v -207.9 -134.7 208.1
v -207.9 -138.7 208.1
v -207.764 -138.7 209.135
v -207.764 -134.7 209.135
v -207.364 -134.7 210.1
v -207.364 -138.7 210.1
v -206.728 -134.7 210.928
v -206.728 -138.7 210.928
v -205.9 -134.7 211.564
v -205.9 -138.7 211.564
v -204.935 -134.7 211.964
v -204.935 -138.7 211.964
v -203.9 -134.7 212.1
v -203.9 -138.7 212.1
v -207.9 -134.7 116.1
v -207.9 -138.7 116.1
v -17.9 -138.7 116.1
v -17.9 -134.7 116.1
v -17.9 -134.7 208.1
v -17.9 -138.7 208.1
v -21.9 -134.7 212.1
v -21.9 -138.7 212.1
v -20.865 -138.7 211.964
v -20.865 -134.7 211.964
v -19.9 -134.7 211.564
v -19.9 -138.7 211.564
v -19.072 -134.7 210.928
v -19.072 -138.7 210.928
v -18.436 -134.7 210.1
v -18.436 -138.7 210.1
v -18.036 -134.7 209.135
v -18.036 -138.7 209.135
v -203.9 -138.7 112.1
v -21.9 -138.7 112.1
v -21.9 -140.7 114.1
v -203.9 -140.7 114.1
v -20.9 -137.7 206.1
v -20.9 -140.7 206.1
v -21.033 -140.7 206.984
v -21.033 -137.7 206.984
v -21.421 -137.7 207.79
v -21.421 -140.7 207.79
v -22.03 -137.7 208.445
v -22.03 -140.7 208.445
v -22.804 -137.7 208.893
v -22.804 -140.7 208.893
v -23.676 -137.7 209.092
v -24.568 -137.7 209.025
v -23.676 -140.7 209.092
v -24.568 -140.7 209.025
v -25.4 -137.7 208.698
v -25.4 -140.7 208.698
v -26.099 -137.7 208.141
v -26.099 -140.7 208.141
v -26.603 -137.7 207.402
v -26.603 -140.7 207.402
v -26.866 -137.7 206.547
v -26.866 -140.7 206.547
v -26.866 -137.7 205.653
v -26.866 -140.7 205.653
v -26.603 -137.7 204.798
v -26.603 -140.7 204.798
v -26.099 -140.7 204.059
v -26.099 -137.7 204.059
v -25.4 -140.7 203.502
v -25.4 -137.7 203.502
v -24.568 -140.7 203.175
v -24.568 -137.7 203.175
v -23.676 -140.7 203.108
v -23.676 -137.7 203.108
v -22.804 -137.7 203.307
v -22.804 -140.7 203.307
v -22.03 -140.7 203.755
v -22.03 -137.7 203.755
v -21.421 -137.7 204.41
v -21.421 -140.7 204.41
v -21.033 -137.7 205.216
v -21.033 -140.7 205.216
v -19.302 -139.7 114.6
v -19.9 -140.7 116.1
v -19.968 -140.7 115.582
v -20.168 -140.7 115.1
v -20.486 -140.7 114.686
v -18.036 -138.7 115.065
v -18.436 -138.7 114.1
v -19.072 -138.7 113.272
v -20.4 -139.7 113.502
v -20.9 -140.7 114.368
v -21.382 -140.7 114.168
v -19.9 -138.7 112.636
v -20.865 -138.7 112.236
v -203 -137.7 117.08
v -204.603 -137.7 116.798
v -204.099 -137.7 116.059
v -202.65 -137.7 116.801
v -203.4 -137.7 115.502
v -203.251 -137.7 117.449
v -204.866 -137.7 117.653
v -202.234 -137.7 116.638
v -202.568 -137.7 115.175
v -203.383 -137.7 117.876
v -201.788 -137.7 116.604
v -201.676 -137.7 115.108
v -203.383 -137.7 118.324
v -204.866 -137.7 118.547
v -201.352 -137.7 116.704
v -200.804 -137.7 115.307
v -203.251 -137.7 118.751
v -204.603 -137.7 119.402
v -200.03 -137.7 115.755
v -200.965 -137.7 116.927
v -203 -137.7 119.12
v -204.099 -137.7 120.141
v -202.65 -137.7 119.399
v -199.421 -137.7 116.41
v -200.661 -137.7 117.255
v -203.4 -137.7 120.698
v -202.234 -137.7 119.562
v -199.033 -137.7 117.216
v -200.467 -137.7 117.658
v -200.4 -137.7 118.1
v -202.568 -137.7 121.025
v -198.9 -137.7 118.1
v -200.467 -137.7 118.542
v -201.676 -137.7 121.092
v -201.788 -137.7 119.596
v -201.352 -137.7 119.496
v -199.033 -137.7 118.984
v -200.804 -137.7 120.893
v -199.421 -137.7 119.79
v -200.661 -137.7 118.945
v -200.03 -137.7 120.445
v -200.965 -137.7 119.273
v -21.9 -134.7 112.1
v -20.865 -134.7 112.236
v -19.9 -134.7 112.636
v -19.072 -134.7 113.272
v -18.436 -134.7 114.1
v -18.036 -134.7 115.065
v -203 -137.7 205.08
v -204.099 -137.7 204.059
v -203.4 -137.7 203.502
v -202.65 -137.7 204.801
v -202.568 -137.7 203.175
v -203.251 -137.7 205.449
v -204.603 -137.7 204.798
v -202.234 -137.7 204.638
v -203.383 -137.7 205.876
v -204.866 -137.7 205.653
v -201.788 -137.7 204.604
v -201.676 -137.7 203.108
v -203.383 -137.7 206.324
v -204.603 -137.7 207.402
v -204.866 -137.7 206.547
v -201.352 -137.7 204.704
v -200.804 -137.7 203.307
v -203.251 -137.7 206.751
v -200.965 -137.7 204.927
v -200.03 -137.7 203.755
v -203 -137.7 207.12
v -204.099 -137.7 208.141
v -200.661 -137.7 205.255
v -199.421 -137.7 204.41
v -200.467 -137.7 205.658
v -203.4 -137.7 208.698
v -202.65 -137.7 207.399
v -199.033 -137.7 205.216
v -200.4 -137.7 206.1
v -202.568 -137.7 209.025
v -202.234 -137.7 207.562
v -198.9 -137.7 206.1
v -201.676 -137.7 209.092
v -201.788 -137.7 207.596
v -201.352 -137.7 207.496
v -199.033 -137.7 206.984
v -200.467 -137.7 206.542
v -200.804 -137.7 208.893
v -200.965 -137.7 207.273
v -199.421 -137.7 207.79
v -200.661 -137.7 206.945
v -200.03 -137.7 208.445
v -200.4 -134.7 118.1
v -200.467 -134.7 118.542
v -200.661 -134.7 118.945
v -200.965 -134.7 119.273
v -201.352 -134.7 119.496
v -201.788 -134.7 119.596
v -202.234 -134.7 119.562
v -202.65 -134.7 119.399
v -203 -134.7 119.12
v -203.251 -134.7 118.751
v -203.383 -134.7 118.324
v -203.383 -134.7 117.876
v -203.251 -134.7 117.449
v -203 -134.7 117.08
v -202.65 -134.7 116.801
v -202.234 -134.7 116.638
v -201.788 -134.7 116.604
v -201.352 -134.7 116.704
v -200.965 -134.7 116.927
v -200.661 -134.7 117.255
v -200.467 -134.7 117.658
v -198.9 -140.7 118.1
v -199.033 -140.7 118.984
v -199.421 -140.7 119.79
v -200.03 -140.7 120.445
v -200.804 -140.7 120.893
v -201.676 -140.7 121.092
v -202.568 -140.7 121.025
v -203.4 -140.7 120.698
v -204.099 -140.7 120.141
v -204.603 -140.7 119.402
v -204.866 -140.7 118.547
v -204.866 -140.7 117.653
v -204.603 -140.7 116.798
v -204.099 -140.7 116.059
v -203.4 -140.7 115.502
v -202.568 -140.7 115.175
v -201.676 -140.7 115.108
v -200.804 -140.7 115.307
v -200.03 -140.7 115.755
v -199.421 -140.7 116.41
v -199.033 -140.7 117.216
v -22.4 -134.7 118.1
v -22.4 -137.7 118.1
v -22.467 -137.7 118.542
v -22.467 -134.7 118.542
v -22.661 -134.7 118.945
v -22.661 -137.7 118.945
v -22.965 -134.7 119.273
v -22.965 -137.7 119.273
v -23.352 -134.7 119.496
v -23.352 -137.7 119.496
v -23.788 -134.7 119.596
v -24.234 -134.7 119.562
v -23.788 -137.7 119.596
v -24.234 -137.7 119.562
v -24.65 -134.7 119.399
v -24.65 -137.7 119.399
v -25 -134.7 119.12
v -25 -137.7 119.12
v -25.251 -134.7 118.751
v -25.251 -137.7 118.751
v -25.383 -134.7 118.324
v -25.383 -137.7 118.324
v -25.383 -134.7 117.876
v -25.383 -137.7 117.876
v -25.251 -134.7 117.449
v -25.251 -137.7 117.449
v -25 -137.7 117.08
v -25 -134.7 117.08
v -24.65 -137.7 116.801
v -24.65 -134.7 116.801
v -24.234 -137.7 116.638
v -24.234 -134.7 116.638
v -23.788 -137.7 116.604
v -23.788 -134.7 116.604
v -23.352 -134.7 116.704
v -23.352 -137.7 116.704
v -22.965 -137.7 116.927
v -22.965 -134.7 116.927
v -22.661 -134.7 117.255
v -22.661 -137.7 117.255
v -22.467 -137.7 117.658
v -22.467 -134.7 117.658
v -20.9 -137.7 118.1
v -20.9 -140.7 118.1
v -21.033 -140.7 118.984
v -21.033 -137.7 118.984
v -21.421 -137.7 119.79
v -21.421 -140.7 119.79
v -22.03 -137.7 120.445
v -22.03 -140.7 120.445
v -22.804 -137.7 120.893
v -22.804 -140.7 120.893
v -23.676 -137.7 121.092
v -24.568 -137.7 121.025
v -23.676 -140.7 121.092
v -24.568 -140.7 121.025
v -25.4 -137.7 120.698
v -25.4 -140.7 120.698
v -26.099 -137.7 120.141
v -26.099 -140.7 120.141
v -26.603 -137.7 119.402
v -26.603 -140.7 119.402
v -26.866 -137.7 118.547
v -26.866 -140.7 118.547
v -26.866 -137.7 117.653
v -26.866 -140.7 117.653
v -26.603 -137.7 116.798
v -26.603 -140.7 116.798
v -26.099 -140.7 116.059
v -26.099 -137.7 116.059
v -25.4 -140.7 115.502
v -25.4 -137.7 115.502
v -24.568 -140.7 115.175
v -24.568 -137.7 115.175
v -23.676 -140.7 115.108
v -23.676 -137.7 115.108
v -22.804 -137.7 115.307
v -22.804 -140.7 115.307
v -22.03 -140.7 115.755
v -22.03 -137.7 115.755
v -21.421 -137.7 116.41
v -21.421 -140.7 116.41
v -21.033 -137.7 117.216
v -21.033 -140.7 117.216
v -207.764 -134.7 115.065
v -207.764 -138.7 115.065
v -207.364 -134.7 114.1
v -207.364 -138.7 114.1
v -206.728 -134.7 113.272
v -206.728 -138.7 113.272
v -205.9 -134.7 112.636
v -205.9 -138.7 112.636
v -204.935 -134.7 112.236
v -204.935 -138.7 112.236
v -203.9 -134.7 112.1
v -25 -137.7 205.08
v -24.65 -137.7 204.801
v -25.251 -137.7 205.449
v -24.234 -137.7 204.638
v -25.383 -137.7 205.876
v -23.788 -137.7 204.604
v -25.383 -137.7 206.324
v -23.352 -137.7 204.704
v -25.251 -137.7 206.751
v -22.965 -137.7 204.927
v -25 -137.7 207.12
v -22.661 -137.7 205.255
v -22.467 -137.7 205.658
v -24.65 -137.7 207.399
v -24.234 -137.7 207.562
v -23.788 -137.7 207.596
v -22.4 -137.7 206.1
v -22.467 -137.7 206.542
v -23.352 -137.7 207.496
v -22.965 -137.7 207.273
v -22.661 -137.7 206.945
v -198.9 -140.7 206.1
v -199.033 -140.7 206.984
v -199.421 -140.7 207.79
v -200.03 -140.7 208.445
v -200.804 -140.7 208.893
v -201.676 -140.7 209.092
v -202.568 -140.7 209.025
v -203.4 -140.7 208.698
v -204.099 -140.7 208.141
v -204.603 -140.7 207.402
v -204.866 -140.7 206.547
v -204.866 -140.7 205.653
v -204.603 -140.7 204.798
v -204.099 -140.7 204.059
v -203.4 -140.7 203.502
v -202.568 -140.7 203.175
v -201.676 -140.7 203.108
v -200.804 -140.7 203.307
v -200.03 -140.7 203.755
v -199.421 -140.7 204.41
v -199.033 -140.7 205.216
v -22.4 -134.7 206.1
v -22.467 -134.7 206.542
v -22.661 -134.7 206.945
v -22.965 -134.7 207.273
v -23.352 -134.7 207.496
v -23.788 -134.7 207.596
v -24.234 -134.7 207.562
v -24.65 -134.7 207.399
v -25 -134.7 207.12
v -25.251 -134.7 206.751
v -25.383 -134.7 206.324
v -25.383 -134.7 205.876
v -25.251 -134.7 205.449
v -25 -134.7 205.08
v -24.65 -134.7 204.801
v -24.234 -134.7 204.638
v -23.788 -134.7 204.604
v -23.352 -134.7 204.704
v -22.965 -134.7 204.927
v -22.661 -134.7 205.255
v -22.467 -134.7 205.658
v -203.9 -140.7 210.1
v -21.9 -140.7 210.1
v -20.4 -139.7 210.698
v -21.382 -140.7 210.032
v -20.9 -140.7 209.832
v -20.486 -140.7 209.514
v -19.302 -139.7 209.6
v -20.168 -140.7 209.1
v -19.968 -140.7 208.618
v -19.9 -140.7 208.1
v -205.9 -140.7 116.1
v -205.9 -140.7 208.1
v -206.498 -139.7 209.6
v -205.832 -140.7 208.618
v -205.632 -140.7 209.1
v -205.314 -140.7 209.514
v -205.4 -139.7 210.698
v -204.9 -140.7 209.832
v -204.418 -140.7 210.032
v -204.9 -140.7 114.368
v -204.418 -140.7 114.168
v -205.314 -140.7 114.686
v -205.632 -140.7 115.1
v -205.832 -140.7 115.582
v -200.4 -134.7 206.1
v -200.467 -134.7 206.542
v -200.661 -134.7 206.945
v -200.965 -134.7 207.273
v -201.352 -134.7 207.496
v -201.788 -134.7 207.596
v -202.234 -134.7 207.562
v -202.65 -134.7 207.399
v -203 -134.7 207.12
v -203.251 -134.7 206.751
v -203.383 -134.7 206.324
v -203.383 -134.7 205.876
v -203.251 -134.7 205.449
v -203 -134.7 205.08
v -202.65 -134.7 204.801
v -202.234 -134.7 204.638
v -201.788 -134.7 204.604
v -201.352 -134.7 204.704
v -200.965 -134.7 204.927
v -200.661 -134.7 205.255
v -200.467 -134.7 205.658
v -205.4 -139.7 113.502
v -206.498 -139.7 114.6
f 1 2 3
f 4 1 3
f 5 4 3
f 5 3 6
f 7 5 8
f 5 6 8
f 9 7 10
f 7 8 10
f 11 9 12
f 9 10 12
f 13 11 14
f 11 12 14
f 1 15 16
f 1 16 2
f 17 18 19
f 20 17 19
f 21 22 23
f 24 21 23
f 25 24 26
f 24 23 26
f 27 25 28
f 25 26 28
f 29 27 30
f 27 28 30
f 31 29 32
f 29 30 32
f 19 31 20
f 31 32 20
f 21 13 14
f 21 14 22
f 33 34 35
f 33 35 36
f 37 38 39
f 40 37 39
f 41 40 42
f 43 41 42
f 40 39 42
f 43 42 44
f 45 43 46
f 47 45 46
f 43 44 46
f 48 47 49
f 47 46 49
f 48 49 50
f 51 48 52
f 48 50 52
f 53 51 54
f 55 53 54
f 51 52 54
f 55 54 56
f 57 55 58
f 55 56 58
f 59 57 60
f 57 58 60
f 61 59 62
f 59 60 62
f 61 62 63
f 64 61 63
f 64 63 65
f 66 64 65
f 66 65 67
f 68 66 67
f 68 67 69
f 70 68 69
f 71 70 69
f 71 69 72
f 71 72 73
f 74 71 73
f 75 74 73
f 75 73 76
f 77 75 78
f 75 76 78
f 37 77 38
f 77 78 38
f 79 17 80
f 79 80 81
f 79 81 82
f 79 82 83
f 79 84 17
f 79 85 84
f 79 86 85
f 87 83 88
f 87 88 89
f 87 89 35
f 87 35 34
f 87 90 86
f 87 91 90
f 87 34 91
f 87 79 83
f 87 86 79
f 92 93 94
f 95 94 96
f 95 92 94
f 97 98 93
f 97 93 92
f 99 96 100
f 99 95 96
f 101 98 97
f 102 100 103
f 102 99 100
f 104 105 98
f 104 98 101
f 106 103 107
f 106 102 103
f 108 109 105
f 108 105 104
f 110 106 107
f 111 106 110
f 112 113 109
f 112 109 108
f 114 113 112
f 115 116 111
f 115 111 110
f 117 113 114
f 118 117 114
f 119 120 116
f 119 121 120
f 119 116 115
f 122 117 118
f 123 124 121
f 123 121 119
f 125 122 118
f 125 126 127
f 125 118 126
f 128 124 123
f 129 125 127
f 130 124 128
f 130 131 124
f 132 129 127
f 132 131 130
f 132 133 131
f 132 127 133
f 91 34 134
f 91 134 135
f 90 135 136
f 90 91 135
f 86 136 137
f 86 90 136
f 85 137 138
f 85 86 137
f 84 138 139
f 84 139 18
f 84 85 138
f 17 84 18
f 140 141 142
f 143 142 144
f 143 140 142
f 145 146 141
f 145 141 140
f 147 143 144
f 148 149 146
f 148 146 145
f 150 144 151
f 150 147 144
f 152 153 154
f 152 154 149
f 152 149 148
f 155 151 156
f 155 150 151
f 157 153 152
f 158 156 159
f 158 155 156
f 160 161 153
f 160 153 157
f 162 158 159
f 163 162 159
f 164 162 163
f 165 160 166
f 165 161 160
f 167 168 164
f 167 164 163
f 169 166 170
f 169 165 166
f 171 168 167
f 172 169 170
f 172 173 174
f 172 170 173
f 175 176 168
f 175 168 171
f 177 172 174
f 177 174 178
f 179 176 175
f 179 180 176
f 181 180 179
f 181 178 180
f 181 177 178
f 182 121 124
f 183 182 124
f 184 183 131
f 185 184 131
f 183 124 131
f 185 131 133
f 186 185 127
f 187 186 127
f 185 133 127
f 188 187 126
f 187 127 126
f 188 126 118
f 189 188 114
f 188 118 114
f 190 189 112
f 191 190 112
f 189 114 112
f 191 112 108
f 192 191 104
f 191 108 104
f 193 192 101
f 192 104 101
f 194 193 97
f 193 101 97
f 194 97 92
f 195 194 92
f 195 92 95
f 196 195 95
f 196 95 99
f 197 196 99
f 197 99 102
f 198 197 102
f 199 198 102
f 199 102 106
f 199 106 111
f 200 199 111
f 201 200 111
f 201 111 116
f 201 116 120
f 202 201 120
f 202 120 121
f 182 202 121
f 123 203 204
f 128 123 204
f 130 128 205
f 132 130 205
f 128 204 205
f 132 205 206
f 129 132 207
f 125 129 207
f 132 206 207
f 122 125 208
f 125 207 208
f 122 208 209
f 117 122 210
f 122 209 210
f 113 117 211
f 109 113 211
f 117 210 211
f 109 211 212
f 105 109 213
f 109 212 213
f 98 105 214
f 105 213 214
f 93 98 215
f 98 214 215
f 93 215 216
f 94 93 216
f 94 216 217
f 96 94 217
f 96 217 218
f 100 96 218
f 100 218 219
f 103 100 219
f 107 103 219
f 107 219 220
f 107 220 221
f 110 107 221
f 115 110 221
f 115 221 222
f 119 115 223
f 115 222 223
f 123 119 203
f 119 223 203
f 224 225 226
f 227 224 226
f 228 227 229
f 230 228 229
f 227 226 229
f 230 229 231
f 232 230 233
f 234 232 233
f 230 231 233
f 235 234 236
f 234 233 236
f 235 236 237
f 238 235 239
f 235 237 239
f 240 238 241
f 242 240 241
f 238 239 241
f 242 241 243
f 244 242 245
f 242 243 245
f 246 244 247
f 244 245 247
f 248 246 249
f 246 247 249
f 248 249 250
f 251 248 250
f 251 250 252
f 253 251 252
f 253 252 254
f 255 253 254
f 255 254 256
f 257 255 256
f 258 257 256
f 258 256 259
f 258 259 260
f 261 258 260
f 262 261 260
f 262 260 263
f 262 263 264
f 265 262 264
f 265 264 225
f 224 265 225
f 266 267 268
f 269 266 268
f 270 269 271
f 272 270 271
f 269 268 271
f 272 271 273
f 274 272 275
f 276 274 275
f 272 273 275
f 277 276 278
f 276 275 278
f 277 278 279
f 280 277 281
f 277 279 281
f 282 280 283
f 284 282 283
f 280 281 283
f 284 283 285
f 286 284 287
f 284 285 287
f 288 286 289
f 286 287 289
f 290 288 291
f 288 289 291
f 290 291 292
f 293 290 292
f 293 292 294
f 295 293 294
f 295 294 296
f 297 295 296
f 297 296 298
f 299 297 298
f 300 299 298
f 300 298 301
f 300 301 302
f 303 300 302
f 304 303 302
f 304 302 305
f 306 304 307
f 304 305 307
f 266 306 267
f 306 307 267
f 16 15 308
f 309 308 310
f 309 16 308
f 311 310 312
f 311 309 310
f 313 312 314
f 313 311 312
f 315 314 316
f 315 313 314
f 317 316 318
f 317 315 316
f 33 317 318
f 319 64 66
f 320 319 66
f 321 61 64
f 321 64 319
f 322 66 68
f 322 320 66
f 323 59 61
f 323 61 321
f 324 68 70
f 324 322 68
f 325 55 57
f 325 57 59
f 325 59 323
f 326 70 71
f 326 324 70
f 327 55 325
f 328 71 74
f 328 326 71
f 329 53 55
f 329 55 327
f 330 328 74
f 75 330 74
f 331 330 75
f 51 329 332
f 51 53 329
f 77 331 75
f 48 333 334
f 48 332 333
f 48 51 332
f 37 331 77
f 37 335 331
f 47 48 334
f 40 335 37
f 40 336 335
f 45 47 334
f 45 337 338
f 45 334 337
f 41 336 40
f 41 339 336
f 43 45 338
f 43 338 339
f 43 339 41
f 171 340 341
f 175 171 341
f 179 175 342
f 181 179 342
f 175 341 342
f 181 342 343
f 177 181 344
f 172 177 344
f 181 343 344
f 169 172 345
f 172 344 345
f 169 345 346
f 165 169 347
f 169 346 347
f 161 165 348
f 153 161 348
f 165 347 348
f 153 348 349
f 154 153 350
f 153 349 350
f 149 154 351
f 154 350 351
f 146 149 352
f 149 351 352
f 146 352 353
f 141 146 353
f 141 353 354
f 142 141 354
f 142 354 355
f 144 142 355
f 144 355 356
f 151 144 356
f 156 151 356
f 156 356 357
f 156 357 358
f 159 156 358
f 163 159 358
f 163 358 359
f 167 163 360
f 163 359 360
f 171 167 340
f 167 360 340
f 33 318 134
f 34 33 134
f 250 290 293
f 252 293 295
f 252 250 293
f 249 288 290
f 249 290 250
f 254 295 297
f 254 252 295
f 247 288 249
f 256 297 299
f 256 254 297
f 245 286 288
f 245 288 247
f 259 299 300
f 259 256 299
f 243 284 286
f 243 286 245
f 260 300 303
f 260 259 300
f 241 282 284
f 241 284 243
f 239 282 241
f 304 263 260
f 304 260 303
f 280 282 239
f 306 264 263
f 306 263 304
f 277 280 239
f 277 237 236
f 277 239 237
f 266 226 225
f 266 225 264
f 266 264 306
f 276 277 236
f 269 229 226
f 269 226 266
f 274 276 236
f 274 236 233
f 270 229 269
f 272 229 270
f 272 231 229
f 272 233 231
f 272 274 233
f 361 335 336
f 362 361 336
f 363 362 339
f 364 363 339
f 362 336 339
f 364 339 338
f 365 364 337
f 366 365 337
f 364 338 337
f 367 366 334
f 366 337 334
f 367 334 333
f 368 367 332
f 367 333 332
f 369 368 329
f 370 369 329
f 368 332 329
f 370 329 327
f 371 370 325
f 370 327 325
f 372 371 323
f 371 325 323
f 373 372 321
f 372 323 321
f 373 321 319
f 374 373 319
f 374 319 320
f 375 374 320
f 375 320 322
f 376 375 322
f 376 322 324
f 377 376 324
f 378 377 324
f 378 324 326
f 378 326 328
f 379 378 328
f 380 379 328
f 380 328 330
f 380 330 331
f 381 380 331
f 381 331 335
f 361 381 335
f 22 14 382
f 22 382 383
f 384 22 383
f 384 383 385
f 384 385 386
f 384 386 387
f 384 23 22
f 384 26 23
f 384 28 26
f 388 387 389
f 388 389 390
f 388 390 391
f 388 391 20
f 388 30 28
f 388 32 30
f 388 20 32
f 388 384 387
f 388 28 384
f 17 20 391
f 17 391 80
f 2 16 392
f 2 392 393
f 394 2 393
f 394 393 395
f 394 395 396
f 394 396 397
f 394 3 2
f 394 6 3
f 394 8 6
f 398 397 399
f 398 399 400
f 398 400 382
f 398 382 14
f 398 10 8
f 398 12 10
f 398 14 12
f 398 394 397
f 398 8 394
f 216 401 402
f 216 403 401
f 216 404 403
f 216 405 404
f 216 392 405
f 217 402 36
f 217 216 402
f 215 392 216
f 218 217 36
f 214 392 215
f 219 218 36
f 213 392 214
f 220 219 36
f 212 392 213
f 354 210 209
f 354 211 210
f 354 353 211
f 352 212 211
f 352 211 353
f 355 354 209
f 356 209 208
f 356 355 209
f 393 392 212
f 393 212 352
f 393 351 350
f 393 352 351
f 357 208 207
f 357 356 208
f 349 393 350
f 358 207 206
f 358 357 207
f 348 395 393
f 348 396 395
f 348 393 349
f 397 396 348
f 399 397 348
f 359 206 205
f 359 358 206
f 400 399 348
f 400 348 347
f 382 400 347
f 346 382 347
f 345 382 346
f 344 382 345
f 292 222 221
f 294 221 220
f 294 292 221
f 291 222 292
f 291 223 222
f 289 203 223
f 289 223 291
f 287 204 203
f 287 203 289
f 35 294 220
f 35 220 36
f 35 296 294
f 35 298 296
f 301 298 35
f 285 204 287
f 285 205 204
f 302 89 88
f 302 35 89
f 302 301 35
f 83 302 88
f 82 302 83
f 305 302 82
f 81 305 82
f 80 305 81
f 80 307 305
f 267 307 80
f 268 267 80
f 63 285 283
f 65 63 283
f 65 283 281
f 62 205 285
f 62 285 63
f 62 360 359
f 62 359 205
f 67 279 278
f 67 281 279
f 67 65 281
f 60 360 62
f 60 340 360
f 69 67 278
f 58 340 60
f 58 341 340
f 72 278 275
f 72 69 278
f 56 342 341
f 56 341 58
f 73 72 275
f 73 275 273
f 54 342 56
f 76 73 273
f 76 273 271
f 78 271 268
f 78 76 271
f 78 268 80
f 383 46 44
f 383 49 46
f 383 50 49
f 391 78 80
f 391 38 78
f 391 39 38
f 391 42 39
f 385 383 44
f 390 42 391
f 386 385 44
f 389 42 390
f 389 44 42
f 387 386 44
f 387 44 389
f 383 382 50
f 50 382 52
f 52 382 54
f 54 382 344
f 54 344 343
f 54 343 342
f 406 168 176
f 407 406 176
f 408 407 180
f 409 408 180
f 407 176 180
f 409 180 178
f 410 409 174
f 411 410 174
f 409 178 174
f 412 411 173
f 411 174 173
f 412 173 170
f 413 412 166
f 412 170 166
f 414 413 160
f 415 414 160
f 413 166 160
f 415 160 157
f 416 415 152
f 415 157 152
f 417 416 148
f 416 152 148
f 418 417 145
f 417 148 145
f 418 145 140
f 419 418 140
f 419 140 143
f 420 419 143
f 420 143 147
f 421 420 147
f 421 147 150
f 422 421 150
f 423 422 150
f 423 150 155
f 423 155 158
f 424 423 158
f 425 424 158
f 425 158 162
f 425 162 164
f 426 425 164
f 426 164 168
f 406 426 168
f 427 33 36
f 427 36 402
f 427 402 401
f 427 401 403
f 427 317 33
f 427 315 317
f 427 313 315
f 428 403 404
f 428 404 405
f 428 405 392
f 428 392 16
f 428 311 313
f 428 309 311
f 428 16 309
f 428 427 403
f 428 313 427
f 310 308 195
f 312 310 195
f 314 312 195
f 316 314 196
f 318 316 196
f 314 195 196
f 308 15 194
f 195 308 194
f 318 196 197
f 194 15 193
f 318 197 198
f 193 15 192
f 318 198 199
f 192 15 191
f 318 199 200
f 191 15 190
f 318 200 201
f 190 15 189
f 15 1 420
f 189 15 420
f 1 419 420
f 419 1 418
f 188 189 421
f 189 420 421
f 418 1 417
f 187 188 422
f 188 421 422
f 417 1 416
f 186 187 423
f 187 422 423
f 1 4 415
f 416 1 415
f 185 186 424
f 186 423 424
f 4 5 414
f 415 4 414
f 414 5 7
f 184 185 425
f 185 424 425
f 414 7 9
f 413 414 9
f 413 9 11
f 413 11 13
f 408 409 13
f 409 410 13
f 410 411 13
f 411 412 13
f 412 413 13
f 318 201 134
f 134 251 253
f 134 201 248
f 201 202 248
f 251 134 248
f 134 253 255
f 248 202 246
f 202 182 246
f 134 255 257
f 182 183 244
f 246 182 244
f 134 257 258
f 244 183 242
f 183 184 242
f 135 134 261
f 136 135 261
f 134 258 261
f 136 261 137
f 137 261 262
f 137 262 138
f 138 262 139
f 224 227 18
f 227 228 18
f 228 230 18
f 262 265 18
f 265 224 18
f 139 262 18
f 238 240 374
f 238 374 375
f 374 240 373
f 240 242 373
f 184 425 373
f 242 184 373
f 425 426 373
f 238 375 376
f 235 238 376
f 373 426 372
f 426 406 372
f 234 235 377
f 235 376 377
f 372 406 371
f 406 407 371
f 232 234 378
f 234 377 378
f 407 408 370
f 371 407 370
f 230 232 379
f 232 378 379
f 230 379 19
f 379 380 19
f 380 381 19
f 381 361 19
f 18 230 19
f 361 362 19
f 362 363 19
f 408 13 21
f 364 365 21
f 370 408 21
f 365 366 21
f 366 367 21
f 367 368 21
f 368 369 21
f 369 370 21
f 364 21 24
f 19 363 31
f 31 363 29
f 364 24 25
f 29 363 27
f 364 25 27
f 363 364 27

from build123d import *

# Parameters (mm, degrees)
SKETCH080_W     = 190
SKETCH080_H     = 100
PAD006_DEPTH    = 6
SKETCH081_R     = 1.5
POCKET026_DEPTH = 6.001
SKETCH082_R     = 3
POCKET027_DEPTH = 3
FILLET022_R     = 4
CHAMFER007_SIZE = 2


with BuildPart() as part:
    # Sketch080 → Pad006 (new body)
    with BuildSketch(Plane.XZ):
        with Locations((-95, 50)):
            Rectangle(SKETCH080_W, SKETCH080_H)
    extrude(amount=PAD006_DEPTH)

    # Sketch081 (on Face6 of Pad006) → Pocket026 (cut, through all)
    with BuildSketch(Plane.XZ.offset(6)):
        with Locations((-184, 94)):
            Circle(SKETCH081_R)
        with Locations((-6, 94)):
            Circle(SKETCH081_R)
        with Locations((-184, 6)):
            Circle(SKETCH081_R)
        with Locations((-6, 6)):
            Circle(SKETCH081_R)
    extrude(amount=-POCKET026_DEPTH, mode=Mode.SUBTRACT)

    # Sketch082 → Pocket027 (cut)
    with BuildSketch(Plane.XZ.offset(6)):
        with Locations((-184, 94)):
            Circle(SKETCH082_R)
        with Locations((-6, 94)):
            Circle(SKETCH082_R)
        with Locations((-184, 6)):
            Circle(SKETCH082_R)
        with Locations((-6, 6)):
            Circle(SKETCH082_R)
    extrude(amount=-POCKET027_DEPTH, mode=Mode.SUBTRACT)

    # Fillet022
    fillet022_edges = [part.edges().sort_by_distance(p)[0] for p in [
        (-190, -3, 100),
        (0, -3, 100),
        (0, -3, 0),
        (-190, -3, 0),
    ]]
    fillet(fillet022_edges, radius=FILLET022_R)

    # Chamfer007
    chamfer007_edges = [part.edges().sort_by_distance(p)[0] for p in [
        (-95, -6, 100),
    ]]
    chamfer(chamfer007_edges, length=CHAMFER007_SIZE)


with BuildPart() as part_1:
    # Body placement: moved
    add(part.part.moved(Location((-17.9, -134.7, 112.1))))


solid = part_1.part
